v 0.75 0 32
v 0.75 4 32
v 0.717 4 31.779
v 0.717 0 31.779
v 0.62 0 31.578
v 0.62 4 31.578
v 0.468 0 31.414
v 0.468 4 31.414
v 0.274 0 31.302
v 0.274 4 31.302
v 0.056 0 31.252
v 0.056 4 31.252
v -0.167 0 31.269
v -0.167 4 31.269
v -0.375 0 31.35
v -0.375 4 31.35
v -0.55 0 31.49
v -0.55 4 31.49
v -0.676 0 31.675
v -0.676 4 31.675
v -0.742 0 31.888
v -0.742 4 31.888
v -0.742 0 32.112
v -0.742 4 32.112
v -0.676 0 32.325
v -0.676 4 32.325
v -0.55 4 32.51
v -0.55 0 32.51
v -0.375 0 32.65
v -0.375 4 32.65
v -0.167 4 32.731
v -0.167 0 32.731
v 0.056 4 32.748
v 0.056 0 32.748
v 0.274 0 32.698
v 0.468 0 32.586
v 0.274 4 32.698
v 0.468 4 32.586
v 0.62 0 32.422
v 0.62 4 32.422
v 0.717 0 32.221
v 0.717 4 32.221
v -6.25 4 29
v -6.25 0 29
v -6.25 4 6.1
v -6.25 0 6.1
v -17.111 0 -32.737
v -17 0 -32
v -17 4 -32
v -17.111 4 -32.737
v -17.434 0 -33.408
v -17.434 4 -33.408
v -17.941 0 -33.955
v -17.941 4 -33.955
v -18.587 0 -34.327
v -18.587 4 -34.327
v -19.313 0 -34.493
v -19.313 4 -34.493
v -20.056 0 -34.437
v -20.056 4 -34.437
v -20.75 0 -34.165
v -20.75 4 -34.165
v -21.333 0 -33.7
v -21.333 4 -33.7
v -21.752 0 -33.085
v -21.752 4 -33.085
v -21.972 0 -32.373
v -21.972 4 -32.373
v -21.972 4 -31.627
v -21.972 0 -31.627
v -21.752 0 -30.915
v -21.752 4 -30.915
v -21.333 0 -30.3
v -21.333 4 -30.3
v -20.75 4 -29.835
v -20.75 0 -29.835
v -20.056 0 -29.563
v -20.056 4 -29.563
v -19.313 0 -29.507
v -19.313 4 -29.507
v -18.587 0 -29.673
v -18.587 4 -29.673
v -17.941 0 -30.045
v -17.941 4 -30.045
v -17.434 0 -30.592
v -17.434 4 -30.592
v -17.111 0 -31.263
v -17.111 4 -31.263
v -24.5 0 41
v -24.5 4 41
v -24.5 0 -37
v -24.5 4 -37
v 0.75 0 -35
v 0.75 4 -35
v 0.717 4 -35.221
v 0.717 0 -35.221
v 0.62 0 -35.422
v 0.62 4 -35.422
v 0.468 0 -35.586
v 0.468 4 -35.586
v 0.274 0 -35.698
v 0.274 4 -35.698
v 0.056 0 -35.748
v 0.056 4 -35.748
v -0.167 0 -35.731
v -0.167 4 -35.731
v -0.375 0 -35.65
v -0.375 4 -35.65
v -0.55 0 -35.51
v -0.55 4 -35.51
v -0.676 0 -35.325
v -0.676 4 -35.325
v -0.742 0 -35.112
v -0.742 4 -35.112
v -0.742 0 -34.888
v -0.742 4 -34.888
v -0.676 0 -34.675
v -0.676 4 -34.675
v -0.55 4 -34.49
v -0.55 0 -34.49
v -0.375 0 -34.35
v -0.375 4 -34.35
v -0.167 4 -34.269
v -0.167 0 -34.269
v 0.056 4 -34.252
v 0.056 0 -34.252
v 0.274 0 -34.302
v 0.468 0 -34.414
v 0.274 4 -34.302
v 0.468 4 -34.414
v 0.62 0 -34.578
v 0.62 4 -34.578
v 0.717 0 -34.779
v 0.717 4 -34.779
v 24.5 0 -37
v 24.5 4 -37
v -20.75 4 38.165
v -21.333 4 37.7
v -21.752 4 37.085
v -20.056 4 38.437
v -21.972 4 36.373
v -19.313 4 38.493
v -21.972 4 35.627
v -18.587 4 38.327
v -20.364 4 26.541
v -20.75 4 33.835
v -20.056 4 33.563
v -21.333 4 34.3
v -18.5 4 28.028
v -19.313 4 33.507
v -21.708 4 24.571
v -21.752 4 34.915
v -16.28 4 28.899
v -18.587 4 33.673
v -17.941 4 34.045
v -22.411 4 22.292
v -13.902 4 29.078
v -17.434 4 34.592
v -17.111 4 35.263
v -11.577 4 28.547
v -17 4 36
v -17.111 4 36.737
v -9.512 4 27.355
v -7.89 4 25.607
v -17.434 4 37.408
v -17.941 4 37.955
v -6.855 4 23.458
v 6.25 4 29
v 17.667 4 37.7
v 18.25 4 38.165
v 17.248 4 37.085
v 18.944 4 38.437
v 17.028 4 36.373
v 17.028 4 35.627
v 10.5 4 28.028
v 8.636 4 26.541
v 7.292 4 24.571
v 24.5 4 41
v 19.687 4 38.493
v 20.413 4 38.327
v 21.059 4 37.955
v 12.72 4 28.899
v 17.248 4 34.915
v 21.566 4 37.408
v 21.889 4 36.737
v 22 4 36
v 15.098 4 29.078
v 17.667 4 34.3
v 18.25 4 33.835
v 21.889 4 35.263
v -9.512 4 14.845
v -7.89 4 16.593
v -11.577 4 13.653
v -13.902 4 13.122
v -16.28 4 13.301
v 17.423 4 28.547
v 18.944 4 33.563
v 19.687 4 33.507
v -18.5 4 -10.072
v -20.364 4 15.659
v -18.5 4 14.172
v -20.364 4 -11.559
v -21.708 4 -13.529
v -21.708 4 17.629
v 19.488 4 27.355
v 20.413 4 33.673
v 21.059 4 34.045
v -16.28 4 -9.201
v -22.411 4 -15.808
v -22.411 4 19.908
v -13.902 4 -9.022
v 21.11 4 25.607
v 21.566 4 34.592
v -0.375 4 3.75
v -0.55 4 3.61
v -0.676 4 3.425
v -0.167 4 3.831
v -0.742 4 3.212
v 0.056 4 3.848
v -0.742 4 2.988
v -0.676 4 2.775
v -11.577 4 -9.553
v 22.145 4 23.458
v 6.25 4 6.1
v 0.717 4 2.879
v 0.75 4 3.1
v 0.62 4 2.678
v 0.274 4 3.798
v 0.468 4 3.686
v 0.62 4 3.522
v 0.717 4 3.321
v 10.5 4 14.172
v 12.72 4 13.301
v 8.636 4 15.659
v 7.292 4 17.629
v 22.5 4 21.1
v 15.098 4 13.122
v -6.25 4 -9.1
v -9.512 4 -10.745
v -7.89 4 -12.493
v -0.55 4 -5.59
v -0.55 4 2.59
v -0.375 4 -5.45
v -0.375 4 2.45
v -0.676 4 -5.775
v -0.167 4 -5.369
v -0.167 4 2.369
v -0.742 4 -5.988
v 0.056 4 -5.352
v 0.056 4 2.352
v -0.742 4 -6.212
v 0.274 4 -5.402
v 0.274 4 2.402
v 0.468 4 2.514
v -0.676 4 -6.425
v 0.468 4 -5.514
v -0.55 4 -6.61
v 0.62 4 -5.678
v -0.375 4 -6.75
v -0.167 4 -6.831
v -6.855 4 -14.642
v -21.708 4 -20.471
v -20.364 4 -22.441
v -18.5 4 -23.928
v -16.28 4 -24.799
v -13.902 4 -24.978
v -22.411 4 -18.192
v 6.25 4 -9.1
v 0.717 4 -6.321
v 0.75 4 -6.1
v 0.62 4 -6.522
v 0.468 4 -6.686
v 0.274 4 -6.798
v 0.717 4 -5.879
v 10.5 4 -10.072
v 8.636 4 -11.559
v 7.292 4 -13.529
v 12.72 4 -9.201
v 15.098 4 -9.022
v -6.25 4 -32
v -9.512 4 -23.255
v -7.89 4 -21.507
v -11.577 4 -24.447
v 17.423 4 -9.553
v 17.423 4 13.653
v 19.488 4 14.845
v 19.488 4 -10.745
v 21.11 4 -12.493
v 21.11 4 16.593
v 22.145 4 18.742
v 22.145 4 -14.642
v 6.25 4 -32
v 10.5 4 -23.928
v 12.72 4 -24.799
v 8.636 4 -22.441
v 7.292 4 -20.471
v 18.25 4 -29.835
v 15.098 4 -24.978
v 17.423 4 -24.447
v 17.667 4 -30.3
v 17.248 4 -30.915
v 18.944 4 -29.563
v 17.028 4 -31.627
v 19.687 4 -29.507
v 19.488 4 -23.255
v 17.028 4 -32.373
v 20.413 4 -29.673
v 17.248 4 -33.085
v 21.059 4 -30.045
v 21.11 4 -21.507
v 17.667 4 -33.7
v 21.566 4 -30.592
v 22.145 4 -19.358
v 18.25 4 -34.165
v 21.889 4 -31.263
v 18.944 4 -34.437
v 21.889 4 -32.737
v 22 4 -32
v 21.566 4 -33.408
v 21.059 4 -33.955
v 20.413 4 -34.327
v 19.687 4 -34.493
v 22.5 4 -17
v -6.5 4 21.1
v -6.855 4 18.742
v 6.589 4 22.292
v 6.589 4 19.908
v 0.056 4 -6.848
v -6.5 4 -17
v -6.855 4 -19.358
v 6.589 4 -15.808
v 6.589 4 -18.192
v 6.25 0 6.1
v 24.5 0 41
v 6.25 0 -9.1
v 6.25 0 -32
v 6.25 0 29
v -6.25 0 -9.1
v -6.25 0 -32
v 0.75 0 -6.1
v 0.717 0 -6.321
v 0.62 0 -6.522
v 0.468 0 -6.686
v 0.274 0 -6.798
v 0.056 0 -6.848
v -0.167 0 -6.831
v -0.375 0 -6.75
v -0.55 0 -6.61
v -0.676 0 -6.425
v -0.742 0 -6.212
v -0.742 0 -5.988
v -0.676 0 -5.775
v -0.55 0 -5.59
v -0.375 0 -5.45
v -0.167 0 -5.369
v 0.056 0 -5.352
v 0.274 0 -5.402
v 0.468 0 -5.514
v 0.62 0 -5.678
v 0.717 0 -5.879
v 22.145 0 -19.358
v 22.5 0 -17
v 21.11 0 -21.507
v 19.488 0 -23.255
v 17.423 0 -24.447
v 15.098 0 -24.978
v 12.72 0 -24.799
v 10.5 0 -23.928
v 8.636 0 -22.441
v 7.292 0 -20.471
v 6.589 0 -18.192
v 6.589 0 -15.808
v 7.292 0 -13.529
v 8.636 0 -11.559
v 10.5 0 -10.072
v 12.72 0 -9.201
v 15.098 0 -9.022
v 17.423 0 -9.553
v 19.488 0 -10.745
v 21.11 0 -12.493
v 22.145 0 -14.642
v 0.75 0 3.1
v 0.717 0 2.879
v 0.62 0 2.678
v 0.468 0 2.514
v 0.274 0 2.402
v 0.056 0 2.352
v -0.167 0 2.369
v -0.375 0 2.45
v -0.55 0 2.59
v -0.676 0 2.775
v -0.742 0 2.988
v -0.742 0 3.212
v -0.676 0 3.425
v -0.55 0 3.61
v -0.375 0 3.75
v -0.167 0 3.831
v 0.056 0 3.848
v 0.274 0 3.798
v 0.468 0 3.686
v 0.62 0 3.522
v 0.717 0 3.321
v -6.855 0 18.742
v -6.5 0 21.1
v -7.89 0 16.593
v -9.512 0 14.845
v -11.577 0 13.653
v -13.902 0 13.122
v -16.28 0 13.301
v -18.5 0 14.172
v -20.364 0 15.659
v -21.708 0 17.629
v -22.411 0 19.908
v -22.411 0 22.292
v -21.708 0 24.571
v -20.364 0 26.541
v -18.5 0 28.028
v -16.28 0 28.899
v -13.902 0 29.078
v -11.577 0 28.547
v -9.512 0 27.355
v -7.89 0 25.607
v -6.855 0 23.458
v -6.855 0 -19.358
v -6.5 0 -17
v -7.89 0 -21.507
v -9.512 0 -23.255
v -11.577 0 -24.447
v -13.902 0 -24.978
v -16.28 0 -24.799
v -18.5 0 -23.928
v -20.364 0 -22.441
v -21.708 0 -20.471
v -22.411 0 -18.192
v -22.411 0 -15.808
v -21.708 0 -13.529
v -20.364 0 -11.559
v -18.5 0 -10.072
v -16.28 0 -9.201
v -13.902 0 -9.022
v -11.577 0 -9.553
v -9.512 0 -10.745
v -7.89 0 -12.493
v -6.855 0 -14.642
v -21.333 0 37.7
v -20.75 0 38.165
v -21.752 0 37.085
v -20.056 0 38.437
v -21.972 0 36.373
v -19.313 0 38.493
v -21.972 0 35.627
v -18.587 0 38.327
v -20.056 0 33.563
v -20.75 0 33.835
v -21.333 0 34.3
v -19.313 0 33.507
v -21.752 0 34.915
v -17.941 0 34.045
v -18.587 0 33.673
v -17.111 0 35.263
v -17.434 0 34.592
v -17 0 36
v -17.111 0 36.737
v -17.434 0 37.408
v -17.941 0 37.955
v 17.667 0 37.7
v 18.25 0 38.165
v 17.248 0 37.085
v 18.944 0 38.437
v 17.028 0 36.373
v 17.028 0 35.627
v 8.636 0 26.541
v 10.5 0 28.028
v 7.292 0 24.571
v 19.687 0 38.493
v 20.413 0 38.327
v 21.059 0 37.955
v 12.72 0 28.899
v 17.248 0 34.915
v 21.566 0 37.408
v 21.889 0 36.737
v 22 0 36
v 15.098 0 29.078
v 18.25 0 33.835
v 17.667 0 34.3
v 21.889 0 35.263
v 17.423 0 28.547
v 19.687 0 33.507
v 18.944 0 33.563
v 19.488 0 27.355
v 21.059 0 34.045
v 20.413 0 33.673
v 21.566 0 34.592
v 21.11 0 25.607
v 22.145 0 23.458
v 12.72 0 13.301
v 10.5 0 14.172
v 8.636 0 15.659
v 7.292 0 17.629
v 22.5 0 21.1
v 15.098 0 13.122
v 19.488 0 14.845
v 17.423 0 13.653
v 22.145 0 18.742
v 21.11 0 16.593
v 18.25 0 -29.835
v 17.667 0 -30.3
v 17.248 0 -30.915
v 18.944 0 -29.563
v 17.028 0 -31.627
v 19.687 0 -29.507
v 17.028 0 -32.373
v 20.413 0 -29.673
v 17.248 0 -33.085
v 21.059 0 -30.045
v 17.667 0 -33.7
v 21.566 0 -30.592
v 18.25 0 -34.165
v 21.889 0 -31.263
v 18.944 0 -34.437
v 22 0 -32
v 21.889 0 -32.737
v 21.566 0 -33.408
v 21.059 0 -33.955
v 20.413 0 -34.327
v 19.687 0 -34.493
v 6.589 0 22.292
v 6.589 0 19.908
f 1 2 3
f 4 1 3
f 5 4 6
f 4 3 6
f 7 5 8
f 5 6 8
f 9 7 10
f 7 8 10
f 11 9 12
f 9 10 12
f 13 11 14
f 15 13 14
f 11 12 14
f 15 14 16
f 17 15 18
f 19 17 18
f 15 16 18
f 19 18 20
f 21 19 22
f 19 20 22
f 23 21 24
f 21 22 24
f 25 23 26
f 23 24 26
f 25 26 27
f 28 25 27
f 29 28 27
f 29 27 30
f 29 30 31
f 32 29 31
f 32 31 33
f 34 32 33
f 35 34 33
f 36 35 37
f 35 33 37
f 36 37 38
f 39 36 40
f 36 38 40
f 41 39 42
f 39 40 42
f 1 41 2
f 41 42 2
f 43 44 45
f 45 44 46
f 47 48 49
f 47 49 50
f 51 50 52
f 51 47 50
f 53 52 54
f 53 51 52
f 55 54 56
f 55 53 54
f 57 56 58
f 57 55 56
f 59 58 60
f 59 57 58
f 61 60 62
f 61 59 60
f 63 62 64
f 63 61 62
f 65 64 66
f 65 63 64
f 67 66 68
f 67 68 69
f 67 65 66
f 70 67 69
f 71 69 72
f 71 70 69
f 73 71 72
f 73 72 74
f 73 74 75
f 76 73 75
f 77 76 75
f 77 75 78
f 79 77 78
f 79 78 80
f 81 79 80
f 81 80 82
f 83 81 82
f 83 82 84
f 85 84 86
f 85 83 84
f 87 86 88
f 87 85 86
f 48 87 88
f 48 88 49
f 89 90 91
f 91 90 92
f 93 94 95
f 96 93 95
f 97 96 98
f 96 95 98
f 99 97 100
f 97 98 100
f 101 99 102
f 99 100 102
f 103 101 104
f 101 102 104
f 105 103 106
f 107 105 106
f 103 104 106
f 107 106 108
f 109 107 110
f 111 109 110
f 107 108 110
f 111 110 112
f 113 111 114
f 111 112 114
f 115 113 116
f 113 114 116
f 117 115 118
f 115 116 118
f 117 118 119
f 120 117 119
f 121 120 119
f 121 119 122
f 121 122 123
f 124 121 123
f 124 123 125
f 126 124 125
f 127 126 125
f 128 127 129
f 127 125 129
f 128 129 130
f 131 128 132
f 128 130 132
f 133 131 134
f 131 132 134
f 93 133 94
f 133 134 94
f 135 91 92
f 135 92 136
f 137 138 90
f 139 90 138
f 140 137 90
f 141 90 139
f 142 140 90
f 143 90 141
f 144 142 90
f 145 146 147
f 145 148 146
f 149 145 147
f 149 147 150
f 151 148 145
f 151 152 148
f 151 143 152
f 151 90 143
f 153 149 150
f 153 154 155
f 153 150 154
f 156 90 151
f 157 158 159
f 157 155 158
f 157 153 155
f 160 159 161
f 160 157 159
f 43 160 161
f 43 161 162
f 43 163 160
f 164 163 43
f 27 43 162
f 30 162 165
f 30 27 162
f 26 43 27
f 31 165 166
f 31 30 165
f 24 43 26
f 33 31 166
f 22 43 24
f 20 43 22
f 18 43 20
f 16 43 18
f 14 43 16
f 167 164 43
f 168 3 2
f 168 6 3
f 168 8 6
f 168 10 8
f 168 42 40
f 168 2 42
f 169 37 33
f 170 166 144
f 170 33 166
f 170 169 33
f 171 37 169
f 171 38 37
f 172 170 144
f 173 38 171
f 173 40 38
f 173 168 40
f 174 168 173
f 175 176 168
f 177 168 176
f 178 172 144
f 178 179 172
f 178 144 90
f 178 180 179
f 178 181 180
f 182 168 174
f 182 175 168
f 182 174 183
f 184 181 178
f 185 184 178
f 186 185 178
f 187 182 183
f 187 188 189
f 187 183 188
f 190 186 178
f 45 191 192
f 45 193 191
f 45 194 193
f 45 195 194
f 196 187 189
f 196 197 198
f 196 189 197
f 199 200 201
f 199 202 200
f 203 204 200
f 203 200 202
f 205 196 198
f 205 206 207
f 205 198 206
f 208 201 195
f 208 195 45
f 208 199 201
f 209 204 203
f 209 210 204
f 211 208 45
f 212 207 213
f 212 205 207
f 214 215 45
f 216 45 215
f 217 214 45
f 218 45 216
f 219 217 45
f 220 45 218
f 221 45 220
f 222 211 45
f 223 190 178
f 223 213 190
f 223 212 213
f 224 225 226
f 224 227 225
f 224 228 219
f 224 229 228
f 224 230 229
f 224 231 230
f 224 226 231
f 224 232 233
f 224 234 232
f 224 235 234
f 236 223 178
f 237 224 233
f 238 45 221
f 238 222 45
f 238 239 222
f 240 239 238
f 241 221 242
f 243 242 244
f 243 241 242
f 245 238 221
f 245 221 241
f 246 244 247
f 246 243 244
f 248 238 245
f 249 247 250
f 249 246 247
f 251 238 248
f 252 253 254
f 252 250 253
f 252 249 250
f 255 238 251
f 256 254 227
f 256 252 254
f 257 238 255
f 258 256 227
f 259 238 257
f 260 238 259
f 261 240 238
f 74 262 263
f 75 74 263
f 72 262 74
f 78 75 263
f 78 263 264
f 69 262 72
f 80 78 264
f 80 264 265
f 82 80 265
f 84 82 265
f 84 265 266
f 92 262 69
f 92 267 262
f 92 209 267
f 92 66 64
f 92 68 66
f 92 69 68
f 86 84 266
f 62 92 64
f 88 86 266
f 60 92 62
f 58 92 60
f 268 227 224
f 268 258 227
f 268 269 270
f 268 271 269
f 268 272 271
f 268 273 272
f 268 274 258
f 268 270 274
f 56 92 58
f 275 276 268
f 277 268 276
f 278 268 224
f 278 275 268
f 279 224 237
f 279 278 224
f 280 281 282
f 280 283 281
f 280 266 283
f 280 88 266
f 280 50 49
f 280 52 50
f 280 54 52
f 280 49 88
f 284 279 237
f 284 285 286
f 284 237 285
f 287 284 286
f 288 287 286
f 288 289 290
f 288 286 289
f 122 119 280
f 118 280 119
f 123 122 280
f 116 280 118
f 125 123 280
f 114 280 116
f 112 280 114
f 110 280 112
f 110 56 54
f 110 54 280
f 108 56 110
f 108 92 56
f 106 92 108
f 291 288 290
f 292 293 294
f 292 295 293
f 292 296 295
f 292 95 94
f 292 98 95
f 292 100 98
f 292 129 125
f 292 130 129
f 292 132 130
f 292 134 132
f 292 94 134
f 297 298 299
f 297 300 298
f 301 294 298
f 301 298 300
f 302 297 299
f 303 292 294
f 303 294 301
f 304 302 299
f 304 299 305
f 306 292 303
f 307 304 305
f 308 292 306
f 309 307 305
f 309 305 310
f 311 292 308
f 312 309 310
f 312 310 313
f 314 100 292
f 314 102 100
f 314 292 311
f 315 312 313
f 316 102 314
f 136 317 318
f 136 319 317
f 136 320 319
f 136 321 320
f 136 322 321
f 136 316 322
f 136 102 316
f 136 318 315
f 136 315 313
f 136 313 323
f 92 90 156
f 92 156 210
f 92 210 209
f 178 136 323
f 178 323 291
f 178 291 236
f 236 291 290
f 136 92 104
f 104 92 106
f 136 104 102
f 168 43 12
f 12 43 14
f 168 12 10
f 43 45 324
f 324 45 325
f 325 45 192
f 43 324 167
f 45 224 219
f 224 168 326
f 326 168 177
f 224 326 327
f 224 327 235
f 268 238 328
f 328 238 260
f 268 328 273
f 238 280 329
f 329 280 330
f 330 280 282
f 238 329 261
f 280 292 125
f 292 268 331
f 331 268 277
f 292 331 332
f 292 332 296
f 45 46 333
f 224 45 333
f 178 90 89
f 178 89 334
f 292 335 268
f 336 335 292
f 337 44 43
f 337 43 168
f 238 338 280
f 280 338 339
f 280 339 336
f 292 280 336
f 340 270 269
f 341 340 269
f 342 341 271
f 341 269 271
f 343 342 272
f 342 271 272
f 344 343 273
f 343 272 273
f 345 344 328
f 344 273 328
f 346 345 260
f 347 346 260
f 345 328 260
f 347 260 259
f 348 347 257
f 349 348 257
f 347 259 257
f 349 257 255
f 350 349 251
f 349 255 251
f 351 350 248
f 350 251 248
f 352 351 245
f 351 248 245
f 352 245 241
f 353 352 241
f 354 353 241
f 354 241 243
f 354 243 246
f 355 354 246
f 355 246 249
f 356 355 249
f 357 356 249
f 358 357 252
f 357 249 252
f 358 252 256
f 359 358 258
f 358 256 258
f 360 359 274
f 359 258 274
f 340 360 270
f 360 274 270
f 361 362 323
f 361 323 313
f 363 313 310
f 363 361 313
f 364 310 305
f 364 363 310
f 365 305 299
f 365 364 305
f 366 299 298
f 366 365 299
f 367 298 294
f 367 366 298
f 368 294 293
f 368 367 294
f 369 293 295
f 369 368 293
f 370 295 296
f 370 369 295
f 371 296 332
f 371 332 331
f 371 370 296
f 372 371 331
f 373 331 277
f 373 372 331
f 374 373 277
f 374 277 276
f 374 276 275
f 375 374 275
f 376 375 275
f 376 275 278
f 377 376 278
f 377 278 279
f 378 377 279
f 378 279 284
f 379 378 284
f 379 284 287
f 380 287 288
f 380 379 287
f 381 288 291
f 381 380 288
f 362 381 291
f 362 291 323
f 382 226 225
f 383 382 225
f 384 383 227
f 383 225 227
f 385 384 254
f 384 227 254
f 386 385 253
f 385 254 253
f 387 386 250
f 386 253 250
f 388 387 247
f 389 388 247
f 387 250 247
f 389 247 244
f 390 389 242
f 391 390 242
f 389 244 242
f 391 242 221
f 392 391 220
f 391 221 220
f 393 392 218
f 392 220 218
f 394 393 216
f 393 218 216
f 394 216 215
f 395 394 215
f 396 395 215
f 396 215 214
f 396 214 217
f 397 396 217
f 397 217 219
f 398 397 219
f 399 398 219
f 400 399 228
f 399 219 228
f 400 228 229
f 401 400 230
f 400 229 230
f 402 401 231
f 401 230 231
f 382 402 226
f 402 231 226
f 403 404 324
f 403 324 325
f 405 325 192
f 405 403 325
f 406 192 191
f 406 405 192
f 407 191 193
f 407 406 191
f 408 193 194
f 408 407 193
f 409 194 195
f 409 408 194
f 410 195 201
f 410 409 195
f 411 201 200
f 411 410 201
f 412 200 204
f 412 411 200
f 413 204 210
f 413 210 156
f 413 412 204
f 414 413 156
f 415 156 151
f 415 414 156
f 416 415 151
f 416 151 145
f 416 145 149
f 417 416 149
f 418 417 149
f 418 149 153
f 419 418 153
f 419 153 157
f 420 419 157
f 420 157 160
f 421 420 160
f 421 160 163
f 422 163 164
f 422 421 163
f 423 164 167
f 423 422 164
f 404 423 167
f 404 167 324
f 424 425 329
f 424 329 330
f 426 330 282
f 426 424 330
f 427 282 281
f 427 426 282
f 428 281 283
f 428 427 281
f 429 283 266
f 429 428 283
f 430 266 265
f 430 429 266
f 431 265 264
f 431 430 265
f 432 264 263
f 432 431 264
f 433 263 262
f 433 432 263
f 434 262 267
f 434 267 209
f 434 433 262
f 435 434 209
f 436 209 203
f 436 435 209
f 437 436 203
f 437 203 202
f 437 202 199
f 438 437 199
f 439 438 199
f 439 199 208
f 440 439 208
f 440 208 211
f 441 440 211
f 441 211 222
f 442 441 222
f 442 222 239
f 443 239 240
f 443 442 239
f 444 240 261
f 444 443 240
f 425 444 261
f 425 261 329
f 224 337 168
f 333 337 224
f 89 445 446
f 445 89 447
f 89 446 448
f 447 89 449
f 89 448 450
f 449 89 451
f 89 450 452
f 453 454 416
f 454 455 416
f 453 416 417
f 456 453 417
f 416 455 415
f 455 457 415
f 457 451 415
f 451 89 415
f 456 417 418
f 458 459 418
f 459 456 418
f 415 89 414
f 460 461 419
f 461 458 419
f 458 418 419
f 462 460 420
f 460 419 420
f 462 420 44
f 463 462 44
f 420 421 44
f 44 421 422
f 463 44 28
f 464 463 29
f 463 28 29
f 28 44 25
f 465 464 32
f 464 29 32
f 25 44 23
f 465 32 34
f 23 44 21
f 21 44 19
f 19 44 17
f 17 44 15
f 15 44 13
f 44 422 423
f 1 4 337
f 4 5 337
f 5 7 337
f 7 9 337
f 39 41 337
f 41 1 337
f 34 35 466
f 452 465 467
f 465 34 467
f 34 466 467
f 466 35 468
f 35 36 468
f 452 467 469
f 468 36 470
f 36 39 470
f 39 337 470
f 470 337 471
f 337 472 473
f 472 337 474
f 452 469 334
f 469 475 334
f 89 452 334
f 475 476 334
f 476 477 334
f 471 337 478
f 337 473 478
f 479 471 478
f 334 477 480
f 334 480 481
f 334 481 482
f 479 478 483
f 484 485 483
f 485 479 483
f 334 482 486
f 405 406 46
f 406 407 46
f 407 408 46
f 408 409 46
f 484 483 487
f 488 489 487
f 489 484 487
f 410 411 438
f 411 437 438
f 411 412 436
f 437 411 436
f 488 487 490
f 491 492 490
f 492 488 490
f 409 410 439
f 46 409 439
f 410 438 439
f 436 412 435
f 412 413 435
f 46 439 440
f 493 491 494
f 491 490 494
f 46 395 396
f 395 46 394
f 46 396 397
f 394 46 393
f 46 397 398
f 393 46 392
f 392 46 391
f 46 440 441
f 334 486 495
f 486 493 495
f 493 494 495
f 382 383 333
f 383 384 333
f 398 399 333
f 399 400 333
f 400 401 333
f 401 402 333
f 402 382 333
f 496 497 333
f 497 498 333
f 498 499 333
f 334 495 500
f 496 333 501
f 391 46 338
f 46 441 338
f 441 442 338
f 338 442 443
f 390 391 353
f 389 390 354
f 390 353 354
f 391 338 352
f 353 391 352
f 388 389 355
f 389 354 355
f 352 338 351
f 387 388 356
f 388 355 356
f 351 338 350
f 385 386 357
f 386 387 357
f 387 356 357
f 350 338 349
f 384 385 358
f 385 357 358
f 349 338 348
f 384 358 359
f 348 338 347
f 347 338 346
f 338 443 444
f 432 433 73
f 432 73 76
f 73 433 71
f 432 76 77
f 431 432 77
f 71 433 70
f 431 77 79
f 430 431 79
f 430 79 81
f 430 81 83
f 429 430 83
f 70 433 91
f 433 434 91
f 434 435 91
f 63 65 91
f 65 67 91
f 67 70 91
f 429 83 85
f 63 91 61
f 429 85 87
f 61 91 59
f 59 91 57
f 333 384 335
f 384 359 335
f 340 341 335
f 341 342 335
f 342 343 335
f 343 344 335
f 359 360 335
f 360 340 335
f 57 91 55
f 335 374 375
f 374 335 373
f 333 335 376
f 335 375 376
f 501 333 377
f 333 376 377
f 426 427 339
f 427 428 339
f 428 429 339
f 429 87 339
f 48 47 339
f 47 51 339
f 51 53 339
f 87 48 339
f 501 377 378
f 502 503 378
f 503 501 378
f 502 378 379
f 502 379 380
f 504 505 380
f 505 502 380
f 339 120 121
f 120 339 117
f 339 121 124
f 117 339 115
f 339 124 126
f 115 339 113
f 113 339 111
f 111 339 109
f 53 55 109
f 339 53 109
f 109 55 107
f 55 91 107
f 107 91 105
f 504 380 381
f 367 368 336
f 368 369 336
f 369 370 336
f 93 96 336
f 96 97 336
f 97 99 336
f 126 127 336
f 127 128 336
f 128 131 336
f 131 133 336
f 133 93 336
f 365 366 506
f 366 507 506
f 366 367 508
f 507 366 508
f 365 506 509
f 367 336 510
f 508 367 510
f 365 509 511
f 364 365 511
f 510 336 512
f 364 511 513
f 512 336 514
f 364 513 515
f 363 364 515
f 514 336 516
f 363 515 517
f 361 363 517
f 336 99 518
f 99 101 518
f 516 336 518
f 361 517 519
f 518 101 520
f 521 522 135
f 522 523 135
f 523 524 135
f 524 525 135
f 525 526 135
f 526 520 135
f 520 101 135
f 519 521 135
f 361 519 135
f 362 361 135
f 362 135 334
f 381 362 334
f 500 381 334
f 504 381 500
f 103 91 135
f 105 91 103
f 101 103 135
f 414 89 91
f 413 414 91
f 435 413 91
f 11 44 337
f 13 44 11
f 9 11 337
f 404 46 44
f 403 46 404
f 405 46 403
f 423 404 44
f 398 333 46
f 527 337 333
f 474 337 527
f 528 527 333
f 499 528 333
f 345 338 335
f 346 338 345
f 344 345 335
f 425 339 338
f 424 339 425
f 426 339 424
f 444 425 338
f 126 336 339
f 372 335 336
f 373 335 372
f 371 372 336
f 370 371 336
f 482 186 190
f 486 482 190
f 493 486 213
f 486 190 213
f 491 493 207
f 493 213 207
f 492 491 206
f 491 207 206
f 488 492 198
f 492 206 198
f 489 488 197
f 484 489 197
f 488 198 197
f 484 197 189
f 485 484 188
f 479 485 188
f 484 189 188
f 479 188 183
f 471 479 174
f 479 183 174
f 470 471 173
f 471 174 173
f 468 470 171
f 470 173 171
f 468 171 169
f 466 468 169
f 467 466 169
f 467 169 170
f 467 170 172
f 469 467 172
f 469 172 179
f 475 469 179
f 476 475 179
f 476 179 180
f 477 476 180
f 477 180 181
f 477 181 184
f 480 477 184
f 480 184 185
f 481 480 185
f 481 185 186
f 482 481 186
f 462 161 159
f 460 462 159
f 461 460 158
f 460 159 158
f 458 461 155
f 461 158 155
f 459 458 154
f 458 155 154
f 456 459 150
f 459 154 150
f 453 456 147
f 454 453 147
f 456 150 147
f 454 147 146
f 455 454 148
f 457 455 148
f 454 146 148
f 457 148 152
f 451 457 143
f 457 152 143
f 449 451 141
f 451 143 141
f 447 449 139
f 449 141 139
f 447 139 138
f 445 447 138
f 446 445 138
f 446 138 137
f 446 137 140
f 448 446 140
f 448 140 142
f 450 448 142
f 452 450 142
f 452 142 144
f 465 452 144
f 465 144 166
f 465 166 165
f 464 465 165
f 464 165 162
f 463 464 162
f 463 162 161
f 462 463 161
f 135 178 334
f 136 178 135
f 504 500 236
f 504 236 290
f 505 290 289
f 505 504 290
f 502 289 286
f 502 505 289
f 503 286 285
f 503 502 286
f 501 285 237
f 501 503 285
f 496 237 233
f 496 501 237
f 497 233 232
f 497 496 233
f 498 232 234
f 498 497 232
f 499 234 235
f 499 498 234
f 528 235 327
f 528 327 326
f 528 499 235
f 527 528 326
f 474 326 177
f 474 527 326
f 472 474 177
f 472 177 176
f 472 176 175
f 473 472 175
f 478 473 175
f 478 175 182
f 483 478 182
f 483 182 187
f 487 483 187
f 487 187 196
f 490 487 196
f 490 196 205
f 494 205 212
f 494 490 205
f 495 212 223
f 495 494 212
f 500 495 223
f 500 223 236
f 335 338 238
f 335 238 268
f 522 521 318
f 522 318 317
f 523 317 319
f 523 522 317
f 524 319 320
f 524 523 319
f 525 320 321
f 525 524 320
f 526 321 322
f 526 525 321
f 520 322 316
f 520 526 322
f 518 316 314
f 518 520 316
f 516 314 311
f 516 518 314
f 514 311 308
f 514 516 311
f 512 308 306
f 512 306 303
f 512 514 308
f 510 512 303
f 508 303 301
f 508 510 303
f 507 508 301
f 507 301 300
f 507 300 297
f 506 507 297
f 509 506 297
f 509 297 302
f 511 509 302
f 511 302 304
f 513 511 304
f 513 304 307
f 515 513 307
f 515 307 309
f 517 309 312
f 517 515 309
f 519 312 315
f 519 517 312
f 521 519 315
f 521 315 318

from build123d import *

# Parameters (mm, degrees)
CROQUIS1_W              = 49
CROQUIS1_H              = 73
CROQUIS1_R              = 8
CROQUIS1_R_2            = 2.5
CROQUIS1_W_2            = 12.5
CROQUIS1_H_2            = 22.9
SALIENTE_EXTRUIR4_DEPTH = 4
CROQUIS5_R              = 0.75
CORTAR_EXTRUIR1_DEPTH   = 4
CROQUIS7_W              = 49
CROQUIS7_H              = 5
SALIENTE_EXTRUIR5_DEPTH = 4
CROQUIS8_R              = 2.5
CORTAR_EXTRUIR2_DEPTH   = 10


with BuildPart() as part:
    # Croquis1 → Saliente-Extruir4 (new body)
    with BuildSketch(Plane(origin=(0, 0, 0), x_dir=(1, 0, 0), z_dir=(0, 1, 0))):
        with Locations((0, 0.5)):
            Rectangle(CROQUIS1_W, CROQUIS1_H)
        with Locations((14.5, -21.1)):
            Circle(CROQUIS1_R, mode=Mode.SUBTRACT)
        with Locations((-14.5, -21.1)):
            Circle(CROQUIS1_R, mode=Mode.SUBTRACT)
        with Locations((-14.5, 17)):
            Circle(CROQUIS1_R, mode=Mode.SUBTRACT)
        with Locations((14.5, 17)):
            Circle(CROQUIS1_R, mode=Mode.SUBTRACT)
        with Locations((-19.5, 32)):
            Circle(CROQUIS1_R_2, mode=Mode.SUBTRACT)
        with Locations((19.5, 32)):
            Circle(CROQUIS1_R_2, mode=Mode.SUBTRACT)
        with Locations((0, -17.55)):
            Rectangle(CROQUIS1_W_2, CROQUIS1_H_2, mode=Mode.SUBTRACT)
        with Locations((0, 20.55)):
            Rectangle(CROQUIS1_W_2, CROQUIS1_H_2, mode=Mode.SUBTRACT)
    extrude(amount=SALIENTE_EXTRUIR4_DEPTH)

    # Croquis5 → Cortar-Extruir1 (cut)
    with BuildSketch(Plane(origin=(0, 4, 0), x_dir=(1, 0, 0), z_dir=(0, 1, 0))):
        with Locations((0, 35)):
            Circle(CROQUIS5_R)
        with Locations((0, 6.1)):
            Circle(CROQUIS5_R)
        with Locations((0, -3.1)):
            Circle(CROQUIS5_R)
        with Locations((0, -32)):
            Circle(CROQUIS5_R)
    extrude(amount=-CORTAR_EXTRUIR1_DEPTH, mode=Mode.SUBTRACT)

    # Croquis7 → Saliente-Extruir5 (add)
    with BuildSketch(Plane(origin=(0, 4, 0), x_dir=(1, 0, 0), z_dir=(0, 1, 0))):
        with Locations((0, -38.5)):
            Rectangle(CROQUIS7_W, CROQUIS7_H)
    extrude(amount=-SALIENTE_EXTRUIR5_DEPTH)

    # Croquis8 → Cortar-Extruir2 (cut)
    with BuildSketch(Plane(origin=(0, 4, 0), x_dir=(1, 0, 0), z_dir=(0, 1, 0))):
        with Locations((-19.5, -36)):
            Circle(CROQUIS8_R)
        with Locations((19.5, -36)):
            Circle(CROQUIS8_R)
    extrude(amount=-CORTAR_EXTRUIR2_DEPTH, mode=Mode.SUBTRACT)


solid = part.part
